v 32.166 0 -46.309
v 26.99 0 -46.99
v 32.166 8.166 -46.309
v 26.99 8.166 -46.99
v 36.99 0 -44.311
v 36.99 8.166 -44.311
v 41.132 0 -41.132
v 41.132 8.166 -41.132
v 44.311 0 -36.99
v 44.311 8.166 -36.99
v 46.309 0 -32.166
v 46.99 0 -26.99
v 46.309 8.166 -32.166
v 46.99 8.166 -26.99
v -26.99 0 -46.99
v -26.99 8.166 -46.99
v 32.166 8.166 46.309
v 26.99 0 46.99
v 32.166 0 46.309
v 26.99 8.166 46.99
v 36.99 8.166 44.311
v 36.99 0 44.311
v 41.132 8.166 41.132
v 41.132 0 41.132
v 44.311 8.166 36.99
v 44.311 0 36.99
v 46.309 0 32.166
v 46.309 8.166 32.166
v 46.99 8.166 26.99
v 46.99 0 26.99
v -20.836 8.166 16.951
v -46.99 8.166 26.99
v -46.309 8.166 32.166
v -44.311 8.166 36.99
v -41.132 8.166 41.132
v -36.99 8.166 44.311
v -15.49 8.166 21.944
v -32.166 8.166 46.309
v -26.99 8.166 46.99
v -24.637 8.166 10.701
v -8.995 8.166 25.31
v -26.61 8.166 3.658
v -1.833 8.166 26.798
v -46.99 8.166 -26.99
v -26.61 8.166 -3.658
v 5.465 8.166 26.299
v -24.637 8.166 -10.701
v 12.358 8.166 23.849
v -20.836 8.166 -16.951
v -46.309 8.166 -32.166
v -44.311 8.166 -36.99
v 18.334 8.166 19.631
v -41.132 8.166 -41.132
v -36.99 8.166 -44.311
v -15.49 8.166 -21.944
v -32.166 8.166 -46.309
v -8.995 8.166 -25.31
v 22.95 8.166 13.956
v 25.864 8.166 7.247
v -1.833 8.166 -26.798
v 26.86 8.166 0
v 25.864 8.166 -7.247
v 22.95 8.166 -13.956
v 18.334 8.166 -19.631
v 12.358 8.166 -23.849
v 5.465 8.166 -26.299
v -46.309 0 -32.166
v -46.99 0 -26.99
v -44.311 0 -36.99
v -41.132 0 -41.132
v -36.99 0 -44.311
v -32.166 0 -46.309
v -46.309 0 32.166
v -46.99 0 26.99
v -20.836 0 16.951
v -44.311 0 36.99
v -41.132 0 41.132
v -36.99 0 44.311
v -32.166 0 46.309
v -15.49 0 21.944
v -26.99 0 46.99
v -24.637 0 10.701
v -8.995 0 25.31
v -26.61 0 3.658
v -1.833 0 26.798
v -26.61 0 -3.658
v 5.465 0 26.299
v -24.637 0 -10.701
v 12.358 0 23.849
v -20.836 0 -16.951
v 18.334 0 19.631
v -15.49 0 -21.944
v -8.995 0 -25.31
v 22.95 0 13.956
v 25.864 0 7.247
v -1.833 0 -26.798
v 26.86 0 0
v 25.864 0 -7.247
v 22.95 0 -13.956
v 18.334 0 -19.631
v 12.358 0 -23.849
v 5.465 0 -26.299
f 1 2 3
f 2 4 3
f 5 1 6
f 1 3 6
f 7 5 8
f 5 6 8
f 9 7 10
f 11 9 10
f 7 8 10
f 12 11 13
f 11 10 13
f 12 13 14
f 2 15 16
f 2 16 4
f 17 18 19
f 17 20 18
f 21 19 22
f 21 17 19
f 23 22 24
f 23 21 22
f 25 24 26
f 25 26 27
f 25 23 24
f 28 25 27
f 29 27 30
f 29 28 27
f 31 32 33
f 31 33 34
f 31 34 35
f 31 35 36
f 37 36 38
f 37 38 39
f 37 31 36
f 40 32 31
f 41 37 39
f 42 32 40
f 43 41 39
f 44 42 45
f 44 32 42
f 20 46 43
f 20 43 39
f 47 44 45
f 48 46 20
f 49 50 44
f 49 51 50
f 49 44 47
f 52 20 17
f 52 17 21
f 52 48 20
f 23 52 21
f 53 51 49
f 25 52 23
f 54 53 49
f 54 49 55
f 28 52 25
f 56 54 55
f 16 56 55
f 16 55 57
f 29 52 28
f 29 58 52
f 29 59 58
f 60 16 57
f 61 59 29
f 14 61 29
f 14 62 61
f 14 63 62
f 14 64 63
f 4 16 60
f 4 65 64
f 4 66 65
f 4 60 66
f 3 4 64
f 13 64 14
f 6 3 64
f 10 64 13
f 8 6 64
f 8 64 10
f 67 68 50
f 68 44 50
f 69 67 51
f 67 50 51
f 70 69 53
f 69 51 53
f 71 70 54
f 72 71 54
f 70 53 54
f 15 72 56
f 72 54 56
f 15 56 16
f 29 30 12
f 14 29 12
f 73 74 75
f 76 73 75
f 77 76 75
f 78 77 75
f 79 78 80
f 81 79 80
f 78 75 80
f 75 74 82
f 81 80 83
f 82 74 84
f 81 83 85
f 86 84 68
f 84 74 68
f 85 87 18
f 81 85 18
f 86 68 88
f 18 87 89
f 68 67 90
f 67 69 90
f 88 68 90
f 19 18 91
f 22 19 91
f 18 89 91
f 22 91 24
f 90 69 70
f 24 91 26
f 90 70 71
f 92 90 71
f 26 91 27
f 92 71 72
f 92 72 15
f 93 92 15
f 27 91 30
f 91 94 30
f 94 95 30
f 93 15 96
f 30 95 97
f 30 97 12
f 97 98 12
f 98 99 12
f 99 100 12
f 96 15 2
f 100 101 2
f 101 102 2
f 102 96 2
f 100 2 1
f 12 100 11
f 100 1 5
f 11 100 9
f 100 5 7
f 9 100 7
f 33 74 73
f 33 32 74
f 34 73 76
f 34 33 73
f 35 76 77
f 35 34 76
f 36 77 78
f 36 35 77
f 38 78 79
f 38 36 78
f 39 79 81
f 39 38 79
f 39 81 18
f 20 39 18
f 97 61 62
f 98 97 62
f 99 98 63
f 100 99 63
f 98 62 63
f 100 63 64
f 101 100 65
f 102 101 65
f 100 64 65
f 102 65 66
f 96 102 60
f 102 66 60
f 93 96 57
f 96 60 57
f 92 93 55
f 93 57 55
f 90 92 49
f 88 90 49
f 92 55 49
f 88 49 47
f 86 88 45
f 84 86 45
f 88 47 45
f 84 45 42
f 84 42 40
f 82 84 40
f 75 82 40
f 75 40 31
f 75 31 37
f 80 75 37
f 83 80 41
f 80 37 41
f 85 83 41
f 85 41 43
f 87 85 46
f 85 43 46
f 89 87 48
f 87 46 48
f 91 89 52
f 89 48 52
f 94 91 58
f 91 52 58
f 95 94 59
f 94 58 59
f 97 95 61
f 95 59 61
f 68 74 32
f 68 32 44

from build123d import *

# Parameters (mm, degrees)
CROQUIS1_W              = 93.98
CROQUIS1_H              = 93.98
SALIENTE_EXTRUIR1_DEPTH = 8.1661
CROQUIS2_R              = 26.8605
CORTAR_EXTRUIR1_DEPTH   = 8.1661
REDONDEO1_R             = 20


with BuildPart() as part:
    # Croquis1 → Saliente-Extruir1 (new body)
    with BuildSketch(Plane(origin=(0, 0, 0), x_dir=(1, 0, 0), z_dir=(0, 1, 0))):
        Rectangle(CROQUIS1_W, CROQUIS1_H)
    extrude(amount=SALIENTE_EXTRUIR1_DEPTH)

    # Croquis2 → Cortar-Extruir1 (cut)
    with BuildSketch(Plane(origin=(0, 8.1661, 0), x_dir=(1, 0, 0), z_dir=(0, 1, 0))):
        Circle(CROQUIS2_R)
    extrude(amount=-CORTAR_EXTRUIR1_DEPTH, mode=Mode.SUBTRACT)

    # Redondeo1
    redondeo1_edges = [part.edges().sort_by_distance(p)[0] for p in [
        (46.99, 4.08305, 46.99),
        (-46.99, 4.08305, 46.99),
        (-46.99, 4.08305, -46.99),
        (46.99, 4.08305, -46.99),
    ]]
    fillet(redondeo1_edges, radius=REDONDEO1_R)


solid = part.part
